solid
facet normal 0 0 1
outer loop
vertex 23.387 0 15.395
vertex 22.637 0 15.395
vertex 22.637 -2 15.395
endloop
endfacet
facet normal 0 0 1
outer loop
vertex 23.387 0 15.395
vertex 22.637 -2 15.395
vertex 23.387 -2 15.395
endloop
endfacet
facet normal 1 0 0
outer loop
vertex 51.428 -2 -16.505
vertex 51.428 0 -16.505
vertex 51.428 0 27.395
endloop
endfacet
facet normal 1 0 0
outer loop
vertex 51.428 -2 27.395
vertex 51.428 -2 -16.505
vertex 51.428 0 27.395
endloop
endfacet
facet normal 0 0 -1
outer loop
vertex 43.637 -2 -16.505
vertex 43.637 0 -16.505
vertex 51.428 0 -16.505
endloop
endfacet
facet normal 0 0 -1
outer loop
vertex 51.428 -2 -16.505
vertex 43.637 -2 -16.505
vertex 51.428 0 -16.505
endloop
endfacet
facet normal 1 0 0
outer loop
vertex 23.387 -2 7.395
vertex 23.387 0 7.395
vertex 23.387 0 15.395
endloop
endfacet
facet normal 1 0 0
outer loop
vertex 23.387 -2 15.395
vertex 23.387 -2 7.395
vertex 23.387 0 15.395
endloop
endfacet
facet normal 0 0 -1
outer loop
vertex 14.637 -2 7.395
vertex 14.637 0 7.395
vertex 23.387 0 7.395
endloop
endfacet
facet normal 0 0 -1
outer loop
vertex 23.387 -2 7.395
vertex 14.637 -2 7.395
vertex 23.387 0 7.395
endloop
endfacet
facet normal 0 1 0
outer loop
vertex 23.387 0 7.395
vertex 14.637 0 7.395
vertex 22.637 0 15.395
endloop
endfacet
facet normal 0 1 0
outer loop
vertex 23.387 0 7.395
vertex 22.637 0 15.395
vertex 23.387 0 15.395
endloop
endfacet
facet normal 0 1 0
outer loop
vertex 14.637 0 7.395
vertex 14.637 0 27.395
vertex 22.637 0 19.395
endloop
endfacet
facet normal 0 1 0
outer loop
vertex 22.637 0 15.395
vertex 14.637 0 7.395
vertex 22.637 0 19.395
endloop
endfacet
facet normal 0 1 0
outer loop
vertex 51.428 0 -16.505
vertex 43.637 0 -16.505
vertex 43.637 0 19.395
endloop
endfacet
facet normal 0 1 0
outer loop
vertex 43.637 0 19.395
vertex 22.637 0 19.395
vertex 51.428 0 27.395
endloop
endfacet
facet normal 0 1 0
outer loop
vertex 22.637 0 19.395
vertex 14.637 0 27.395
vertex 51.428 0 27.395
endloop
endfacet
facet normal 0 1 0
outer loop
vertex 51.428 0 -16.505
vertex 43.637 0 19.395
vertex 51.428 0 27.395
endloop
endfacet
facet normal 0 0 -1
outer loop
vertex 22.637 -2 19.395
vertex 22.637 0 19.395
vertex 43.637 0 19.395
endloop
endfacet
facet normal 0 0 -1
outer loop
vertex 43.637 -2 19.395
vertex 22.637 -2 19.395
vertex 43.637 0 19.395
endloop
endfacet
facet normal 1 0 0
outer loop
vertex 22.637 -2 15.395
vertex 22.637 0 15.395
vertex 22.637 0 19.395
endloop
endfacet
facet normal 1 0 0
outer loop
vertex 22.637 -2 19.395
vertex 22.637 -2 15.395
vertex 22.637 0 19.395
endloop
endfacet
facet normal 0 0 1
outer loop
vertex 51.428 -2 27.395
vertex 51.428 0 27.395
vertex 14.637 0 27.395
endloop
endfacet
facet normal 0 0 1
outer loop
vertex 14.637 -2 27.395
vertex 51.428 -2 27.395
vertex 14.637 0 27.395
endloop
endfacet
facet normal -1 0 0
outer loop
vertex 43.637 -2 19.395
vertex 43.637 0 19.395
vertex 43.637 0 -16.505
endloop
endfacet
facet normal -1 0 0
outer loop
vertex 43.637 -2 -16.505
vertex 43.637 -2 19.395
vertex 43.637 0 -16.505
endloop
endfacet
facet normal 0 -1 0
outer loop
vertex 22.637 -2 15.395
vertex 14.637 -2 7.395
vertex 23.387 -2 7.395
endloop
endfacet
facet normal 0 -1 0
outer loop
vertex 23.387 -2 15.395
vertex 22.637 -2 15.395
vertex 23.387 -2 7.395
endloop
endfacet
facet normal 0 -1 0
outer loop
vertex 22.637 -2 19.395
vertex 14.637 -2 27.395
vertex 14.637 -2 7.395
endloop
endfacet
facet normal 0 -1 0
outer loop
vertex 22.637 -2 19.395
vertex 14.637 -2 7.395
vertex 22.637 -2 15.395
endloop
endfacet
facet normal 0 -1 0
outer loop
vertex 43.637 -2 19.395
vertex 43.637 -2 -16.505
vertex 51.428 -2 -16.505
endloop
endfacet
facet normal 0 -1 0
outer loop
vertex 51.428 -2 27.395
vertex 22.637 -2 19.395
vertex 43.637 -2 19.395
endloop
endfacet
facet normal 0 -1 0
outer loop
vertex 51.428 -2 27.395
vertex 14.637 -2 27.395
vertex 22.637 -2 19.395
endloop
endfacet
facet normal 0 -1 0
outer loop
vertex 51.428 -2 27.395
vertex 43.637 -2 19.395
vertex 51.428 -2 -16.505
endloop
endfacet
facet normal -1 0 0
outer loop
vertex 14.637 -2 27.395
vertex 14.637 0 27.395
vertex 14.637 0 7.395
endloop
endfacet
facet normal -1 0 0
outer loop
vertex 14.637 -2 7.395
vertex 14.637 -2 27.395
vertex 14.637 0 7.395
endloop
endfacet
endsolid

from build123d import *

# Parameters (mm, degrees)
F0_W     = 0.75
F0_H     = 8
F1_DEPTH = 2


with BuildPart() as f1:
    # F0 (on Front) → F1 (new body)
    with BuildSketch(Plane.XZ):
        Polygon((22.636973, 19.394943), (43.636973, 19.394943), (43.636973, 27.394943), (14.636973, 27.394943), (14.636973, 7.394943), (22.636973, 7.394943), (22.636973, 15.394943), align=None)
        with Locations((23.011973, 11.394943)):
            Rectangle(F0_W, F0_H)
        Polygon((43.636973, 27.394943), (43.636973, 19.394943), (43.636973, -16.505208), (51.427811, -16.505208), (51.427811, 27.394943), align=None)
    extrude(amount=F1_DEPTH)


solid = f1.part
